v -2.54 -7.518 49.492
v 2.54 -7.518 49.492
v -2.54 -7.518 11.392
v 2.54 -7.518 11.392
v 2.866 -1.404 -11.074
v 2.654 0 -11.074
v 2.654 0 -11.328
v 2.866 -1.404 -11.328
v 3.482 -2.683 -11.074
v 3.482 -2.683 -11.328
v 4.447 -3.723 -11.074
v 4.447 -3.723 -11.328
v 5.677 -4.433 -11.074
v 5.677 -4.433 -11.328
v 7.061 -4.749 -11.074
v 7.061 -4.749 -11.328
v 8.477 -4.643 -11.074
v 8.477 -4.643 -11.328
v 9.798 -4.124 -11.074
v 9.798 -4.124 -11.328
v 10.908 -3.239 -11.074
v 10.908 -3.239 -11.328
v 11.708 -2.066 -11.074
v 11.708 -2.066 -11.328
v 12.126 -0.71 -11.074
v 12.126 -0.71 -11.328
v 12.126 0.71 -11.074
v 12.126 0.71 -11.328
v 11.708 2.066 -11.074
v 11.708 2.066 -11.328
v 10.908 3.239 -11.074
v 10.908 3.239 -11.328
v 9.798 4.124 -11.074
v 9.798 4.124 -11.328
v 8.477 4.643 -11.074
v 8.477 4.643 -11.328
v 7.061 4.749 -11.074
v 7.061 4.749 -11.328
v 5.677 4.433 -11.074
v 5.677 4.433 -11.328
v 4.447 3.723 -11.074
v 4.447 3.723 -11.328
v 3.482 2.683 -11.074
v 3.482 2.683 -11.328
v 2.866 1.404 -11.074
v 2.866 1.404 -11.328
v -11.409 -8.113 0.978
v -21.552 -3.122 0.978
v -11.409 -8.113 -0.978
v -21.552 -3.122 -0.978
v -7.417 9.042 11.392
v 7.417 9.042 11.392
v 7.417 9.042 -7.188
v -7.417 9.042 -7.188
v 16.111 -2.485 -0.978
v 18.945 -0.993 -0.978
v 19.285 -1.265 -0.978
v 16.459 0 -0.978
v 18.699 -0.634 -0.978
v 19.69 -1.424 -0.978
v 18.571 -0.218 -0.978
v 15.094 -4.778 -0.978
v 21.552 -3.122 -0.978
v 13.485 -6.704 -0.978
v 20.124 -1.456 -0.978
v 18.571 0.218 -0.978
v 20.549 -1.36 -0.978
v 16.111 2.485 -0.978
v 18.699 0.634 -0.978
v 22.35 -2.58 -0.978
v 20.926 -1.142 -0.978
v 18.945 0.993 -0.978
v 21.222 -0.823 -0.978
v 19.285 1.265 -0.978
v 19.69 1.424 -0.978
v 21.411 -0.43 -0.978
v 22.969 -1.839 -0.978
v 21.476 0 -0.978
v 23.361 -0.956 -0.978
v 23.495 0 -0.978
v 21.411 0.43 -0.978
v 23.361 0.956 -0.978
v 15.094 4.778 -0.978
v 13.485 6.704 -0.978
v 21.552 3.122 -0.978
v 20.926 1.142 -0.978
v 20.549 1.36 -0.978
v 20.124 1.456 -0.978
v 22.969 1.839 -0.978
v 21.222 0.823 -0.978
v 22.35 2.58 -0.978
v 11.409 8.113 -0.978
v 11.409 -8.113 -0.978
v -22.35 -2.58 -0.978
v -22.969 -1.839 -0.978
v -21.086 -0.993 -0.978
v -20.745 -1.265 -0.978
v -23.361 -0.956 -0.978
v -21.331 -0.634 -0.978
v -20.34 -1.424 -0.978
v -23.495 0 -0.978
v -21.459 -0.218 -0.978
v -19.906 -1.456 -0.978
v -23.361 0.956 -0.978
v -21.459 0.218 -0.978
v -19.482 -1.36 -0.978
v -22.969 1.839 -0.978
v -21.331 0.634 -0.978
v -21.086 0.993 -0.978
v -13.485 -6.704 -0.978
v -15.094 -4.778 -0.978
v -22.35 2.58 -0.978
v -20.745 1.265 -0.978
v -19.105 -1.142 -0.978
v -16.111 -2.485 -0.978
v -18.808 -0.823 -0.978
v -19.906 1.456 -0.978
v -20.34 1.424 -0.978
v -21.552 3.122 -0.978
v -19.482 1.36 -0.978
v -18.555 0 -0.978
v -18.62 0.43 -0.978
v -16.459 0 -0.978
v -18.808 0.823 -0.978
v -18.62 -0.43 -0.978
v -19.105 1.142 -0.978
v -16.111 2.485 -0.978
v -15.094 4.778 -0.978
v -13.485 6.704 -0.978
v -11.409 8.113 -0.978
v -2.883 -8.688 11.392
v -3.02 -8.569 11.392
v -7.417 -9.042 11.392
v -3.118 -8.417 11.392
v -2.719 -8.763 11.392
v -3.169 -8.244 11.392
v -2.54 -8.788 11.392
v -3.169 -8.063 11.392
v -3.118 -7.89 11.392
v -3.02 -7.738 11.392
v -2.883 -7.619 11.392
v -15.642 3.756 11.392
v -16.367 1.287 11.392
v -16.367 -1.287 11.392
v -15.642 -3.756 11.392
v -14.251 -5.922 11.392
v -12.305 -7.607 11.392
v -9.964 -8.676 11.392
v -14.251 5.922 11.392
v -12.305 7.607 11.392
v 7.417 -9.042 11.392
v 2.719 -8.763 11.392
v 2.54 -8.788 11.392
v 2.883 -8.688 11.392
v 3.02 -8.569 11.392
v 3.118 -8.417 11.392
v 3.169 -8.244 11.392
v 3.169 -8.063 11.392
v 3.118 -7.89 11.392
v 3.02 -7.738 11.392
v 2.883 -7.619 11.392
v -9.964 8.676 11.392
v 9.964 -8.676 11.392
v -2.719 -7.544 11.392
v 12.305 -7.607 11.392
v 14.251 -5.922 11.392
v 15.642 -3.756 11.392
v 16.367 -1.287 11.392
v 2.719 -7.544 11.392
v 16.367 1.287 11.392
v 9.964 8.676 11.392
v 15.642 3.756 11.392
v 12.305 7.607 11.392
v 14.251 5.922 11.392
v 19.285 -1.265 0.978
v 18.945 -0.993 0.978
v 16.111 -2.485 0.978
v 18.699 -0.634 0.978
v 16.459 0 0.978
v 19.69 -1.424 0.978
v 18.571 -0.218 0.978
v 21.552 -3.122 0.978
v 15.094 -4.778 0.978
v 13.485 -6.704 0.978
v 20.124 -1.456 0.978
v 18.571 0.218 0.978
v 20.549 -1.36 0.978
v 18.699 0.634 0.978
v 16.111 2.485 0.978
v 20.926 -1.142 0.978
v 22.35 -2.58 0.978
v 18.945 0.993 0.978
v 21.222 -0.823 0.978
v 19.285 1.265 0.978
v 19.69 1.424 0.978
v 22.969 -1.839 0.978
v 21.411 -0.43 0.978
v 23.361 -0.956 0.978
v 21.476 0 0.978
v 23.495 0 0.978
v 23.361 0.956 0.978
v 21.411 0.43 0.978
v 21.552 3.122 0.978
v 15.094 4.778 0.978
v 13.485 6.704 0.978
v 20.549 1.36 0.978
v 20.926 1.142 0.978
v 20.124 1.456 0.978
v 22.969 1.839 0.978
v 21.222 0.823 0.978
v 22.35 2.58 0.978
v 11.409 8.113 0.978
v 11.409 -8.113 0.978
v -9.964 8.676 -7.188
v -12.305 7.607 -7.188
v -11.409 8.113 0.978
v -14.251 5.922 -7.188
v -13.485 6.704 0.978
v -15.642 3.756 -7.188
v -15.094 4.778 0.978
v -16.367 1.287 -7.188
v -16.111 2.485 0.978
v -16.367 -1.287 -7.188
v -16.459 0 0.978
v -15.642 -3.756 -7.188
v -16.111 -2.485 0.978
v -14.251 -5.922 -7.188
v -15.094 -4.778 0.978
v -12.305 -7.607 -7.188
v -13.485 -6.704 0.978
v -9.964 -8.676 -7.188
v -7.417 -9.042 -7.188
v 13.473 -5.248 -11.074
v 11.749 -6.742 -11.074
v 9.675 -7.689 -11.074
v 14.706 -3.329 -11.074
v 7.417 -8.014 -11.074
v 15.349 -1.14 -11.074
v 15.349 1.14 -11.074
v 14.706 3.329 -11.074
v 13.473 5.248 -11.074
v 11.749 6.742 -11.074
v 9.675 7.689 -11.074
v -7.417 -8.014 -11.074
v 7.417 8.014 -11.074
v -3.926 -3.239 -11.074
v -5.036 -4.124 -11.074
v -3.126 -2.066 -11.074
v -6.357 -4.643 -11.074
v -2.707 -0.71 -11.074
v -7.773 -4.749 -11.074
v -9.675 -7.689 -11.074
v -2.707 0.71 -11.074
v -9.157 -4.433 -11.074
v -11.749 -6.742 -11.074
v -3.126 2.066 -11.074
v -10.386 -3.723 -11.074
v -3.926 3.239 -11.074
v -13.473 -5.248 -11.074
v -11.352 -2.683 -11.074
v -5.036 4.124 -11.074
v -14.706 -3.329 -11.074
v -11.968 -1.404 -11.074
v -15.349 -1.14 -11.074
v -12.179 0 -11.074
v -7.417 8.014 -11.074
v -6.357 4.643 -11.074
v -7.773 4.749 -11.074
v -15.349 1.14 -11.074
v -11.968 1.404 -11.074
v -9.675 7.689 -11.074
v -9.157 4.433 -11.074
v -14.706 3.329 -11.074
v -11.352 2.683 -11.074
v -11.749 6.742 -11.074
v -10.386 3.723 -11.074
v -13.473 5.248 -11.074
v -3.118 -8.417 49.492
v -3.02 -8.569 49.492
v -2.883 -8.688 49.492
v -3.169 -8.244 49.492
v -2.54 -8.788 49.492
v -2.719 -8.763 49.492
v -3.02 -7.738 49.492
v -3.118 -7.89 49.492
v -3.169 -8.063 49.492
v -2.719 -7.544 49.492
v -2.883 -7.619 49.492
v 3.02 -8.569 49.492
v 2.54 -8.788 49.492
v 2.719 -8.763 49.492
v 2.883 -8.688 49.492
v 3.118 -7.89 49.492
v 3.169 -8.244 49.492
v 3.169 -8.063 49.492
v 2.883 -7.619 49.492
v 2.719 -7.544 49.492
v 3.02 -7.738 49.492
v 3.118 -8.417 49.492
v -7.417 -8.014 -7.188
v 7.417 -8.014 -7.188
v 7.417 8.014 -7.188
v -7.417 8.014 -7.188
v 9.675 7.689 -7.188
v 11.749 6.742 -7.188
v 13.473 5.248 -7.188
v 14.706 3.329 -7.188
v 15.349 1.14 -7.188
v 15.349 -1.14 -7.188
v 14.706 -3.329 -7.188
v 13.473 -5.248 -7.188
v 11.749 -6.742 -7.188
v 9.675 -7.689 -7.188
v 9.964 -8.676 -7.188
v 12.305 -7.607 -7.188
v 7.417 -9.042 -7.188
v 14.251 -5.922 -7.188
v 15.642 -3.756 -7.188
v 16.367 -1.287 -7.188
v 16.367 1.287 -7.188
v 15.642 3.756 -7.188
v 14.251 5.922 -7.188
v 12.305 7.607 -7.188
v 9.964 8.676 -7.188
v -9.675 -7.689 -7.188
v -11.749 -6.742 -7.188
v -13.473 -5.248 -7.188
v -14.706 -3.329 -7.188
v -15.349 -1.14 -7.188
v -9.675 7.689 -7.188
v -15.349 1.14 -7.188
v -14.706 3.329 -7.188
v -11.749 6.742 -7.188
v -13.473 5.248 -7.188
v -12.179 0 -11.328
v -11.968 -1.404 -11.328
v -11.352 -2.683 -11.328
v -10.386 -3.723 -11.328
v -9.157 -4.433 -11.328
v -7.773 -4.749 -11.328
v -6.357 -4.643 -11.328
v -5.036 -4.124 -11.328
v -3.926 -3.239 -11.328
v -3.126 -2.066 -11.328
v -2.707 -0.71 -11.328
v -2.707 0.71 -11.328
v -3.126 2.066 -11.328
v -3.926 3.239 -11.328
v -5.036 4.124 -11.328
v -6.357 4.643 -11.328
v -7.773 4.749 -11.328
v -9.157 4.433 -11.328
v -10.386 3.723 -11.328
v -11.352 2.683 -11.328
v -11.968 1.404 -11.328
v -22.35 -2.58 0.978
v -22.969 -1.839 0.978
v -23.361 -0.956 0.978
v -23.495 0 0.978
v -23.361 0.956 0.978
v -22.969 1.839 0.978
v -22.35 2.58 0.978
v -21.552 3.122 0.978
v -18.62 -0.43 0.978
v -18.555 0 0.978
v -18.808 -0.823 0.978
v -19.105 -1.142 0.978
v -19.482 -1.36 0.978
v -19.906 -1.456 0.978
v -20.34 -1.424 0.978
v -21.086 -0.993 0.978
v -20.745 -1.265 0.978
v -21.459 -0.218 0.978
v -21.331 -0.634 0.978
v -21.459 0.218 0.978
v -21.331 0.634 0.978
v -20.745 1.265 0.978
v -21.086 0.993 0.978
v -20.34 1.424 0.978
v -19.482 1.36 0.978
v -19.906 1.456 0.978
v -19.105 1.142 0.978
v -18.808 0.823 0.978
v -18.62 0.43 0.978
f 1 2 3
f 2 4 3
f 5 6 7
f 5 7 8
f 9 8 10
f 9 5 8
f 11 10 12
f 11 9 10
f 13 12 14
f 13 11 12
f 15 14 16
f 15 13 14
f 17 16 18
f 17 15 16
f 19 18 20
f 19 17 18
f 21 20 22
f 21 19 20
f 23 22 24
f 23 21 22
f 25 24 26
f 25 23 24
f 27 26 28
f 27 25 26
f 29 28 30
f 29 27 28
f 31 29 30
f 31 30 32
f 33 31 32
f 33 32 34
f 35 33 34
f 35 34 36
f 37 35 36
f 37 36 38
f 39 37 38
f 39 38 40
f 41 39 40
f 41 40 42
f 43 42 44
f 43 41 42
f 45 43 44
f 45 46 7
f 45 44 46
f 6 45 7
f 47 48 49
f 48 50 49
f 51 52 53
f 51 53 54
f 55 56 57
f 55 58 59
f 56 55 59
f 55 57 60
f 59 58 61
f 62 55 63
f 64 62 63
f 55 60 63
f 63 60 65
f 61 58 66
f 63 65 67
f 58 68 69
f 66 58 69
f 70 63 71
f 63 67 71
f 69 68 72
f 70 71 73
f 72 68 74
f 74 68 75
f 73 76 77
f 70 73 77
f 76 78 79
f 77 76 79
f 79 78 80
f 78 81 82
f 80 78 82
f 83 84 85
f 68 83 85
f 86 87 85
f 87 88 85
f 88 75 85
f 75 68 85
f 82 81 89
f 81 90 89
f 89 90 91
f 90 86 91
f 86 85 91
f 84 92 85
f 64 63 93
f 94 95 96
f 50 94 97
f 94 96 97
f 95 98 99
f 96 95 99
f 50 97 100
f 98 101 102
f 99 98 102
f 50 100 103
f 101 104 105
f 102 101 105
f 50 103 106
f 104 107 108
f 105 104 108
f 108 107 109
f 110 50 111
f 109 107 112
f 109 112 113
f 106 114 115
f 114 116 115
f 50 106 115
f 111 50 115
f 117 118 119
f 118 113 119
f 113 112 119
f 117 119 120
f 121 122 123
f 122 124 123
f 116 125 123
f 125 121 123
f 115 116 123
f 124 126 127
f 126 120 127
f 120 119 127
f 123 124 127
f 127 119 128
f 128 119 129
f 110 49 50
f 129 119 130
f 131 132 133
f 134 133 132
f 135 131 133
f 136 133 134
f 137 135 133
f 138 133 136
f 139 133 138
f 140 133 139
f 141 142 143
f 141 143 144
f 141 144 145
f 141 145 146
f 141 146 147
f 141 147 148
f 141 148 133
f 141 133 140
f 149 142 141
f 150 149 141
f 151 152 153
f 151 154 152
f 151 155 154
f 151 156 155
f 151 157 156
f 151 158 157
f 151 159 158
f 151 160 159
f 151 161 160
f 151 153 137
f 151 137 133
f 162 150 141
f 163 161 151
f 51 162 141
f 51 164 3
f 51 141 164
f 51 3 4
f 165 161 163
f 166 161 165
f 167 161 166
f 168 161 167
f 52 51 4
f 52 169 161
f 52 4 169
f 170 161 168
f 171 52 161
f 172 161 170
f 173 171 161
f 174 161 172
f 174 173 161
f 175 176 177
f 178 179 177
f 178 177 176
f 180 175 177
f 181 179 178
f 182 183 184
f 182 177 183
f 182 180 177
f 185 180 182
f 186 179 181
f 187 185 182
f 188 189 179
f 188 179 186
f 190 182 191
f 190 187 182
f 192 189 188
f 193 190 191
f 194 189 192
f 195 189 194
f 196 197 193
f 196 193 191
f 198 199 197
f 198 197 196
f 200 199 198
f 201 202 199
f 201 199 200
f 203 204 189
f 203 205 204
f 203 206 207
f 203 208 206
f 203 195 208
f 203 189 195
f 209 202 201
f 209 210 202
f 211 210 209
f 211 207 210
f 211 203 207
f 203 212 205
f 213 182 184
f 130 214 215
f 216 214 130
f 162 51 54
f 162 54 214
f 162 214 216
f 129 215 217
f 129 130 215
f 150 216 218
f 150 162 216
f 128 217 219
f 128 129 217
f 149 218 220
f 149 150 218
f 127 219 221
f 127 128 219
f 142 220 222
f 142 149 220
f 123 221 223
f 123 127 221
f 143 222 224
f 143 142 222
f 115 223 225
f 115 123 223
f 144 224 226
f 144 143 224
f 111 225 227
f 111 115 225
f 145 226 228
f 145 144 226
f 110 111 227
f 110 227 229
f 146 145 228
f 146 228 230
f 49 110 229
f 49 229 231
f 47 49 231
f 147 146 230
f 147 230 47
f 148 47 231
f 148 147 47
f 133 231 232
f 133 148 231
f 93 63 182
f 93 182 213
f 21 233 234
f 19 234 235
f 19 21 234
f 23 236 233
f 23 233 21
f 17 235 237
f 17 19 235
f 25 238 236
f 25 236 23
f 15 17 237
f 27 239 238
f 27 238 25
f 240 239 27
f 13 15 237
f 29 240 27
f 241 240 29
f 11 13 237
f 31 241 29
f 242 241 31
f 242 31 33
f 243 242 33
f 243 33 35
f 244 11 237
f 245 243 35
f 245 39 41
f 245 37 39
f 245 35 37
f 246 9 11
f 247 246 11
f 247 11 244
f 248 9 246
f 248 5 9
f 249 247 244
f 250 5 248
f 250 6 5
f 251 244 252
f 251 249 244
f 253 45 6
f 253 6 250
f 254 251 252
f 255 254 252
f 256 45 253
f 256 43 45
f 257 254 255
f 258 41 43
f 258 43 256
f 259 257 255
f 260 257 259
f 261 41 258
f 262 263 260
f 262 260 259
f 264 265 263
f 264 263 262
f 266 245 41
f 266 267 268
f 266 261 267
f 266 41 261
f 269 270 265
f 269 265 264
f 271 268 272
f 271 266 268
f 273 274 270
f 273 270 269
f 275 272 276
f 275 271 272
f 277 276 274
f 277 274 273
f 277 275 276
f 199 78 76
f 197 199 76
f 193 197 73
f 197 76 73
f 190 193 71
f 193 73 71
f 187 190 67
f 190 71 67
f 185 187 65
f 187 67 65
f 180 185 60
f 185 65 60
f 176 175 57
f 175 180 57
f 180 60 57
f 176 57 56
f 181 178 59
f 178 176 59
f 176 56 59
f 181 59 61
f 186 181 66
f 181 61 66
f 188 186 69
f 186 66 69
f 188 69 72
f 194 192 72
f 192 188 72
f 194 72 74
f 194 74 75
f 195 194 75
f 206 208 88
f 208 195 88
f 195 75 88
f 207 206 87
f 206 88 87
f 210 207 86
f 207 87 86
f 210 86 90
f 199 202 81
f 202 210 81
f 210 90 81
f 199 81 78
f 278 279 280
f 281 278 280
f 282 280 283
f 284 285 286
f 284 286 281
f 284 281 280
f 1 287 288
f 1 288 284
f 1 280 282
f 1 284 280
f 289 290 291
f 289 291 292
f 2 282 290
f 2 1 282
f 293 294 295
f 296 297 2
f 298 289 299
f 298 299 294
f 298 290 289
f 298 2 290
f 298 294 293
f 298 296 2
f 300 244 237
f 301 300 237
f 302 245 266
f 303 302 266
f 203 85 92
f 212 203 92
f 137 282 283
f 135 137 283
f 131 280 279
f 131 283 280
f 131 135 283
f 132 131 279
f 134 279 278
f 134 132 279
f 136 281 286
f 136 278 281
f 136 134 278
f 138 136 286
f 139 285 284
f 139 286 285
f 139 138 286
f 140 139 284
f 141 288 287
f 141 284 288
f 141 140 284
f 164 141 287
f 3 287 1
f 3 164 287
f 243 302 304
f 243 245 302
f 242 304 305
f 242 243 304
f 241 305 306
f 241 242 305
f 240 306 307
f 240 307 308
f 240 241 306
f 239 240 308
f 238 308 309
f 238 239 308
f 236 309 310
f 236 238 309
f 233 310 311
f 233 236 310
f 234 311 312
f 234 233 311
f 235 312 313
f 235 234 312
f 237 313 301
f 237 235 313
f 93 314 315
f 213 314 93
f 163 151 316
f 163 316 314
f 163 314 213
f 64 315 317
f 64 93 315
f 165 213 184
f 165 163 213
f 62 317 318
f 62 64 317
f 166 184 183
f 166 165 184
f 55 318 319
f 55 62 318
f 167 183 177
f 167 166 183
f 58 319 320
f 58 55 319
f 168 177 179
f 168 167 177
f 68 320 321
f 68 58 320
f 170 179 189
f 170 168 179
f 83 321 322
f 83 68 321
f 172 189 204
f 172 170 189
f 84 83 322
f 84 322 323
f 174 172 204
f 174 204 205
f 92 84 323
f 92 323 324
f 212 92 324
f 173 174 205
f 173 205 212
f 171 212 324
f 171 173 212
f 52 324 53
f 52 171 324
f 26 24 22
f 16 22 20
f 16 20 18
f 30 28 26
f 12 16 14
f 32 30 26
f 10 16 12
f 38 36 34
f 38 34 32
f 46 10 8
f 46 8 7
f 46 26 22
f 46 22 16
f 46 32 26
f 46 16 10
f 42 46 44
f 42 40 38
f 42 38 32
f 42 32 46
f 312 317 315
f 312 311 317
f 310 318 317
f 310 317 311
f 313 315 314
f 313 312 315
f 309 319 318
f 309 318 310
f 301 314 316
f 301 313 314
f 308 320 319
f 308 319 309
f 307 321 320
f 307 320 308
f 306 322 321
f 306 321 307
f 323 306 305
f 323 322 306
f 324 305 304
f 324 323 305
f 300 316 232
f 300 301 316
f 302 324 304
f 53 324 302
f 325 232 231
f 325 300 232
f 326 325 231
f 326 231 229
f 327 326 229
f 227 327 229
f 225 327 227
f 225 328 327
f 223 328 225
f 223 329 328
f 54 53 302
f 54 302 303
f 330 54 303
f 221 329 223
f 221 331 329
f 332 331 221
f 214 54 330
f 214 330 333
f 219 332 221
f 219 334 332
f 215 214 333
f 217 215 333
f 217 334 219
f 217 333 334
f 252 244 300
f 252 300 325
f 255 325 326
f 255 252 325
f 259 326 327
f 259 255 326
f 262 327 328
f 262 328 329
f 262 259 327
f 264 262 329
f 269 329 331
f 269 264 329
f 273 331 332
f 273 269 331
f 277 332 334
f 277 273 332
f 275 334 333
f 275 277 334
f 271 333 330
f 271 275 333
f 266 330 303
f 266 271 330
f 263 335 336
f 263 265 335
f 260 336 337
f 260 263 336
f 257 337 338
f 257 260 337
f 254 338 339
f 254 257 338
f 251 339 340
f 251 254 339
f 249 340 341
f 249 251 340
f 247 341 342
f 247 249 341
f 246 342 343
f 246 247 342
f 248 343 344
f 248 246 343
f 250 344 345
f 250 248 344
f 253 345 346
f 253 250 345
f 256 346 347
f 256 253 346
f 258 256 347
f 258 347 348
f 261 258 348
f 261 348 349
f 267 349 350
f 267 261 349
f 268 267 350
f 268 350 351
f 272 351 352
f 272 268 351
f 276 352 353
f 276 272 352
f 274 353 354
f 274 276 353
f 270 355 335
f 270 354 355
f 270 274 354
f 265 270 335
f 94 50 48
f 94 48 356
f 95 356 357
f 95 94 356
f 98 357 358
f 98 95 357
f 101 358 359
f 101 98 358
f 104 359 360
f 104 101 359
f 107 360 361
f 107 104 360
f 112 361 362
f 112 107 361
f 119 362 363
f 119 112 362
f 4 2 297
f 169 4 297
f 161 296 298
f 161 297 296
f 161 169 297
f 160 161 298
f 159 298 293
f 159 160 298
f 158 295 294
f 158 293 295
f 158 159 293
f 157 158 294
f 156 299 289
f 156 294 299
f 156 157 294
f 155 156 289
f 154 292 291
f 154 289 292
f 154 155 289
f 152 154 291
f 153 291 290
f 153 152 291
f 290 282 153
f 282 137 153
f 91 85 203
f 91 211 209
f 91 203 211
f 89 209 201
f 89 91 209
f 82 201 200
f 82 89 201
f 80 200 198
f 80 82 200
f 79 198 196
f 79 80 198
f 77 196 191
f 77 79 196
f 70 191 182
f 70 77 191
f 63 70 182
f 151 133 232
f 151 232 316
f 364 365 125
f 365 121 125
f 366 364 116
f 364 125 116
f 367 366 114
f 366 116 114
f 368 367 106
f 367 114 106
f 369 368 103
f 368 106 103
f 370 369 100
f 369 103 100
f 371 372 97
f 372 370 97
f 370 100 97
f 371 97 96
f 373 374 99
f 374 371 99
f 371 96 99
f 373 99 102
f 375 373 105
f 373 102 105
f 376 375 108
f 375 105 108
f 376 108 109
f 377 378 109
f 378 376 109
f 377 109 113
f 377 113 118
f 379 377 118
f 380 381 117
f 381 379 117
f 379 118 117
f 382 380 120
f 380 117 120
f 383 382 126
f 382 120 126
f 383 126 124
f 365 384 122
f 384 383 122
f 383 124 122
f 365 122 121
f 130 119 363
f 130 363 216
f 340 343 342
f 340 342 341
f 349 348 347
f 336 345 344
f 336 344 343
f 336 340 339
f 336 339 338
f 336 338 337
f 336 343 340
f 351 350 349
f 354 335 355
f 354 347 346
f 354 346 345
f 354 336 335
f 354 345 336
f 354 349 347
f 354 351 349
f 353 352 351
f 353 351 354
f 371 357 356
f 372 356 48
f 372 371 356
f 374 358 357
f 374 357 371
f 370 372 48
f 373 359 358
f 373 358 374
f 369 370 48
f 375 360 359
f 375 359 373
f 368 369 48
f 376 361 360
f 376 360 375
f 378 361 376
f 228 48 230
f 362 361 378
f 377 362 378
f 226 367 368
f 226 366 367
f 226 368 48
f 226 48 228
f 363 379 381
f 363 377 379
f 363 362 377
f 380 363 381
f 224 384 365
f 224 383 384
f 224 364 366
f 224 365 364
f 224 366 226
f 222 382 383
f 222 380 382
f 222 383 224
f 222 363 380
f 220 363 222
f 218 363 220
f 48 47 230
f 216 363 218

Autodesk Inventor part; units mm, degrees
ref_plane "YZ Plane" through (0, 0, 0) normal (1, 0, 0) x (0, 1, 0)
ref_plane "XZ Plane" through (0, 0, 0) normal (0, 1, 0) x (-1, 0, 0)
ref_plane "XY Plane" through (0, 0, 0) normal (0, 0, 1) x (1, 0, 0)
sketch "Sketch12" plane through (0, 0, 0) normal (0, 0, 1) x (1, 0, 0)
  line L0 (-7.4168, 0) -> (7.4168, 0) construction
  line L1 (-7.4168, -9.0424) -> (7.4168, -9.0424)
  line L2 (7.4168, 9.0424) -> (-7.4168, 9.0424)
  arc A0 (-7.4168, 9.0424) -> (-7.4168, -9.0424) centre (-7.4168, 0) ccw
  arc A1 (7.4168, -9.0424) -> (7.4168, 9.0424) centre (7.4168, 0) ccw
  circle A2 centre (-20.0152, 0) radius 1.4605
  line L3 (0, 0) -> (0, -9.0424)
  circle A3 centre (-20.0152, 0) radius 3.4798
  line L4 (-21.5516, -3.1222) -> (-11.4093, -8.1133)
  line L5 (-21.5516, 3.1222) -> (-11.4093, 8.1133)
  circle A4 centre (20.0152, 0) radius 1.4605
  circle A5 centre (20.0152, 0) radius 3.4798
  line L6 (21.5516, -3.1222) -> (11.4093, -8.1133)
  line L7 (21.5516, 3.1222) -> (11.4093, 8.1133)
  point P0 (16.4592, 0)
  point P1 (-16.4592, 0)
  point P2 (11.4093, -8.1133)
  point P3 (11.4093, 8.1133)
  dimension "d107" = 32.9184
  dimension "d108" = 18.0848
  dimension "d109" = 40.0304
  dimension "d110" = 2.921
  dimension "d111" = 46.99
extrude "Extrusion1" add sketch "Sketch12" along normal mid plane 1.9558
sketch "Sketch13" plane through (0, 0, 0.9779) normal (0, 0, 1) x (1, 0, 0)
  arc A0 (-7.4168, 9.0424) -> (-7.4168, -9.0424) centre (-7.4168, 0) ccw projected
  arc A1 (7.4168, -9.0424) -> (7.4168, 9.0424) centre (7.4168, 0) ccw projected
  line L0 (7.4168, 9.0424) -> (-7.4168, 9.0424) projected
  line L1 (-7.4168, -9.0424) -> (7.4168, -9.0424) projected
  point P0 (0, 0)
extrude "Extrusion2" add sketch "Sketch13" along normal blind 10.414
sketch "Sketch14" plane through (0, 0, -0.9779) normal (0, 0, -1) x (-1, 0, 0)
  line L0 (7.4168, -9.0424) -> (-7.4168, -9.0424) projected
  arc A0 (-7.4168, 9.0424) -> (-7.4168, -9.0424) centre (-7.4168, 0) ccw projected
  line L1 (-7.4168, 9.0424) -> (7.4168, 9.0424) projected
  arc A1 (7.4168, -9.0424) -> (7.4168, 9.0424) centre (7.4168, 0) ccw projected
  point P0 (0, 0)
extrude "Extrusion3" add sketch "Sketch14" along normal blind 10.0965
sketch "Sketch15" plane through (0, 0, -11.0744) normal (0, 0, -1) x (-1, 0, 0)
  line L0 (-7.4168, -9.0424) -> (7.4168, -9.0424) projected
  arc A0 (7.4168, -9.0424) -> (7.4168, 9.0424) centre (7.4168, 0) ccw projected
  line L1 (7.4168, 9.0424) -> (-7.4168, 9.0424) projected
  arc A1 (-7.4168, 9.0424) -> (-7.4168, -9.0424) centre (-7.4168, 0) ccw projected
  line L2 (7.4168, -8.0137) -> (-7.4168, -8.0137)
  arc A2 (-7.4168, 8.0137) -> (-7.4168, -8.0137) centre (-7.4168, 0) ccw
  line L3 (-7.4168, 8.0137) -> (7.4168, 8.0137)
  arc A3 (7.4168, -8.0137) -> (7.4168, 8.0137) centre (7.4168, 0) ccw
  point P0 (0, 0)
  dimension "d118" = 16.0274
extrude "Extrusion4" cut sketch "Sketch15" against normal blind 3.8862
sketch "Sketch16" plane through (0, 0, -11.0744) normal (0, 0, -1) x (-1, 0, 0)
  arc A0 (7.4168, -8.0137) -> (7.4168, 8.0137) centre (7.4168, 0) ccw projected
  line L0 (7.4168, 8.0137) -> (-7.4168, 8.0137) projected
  arc A1 (-7.4168, 8.0137) -> (-7.4168, -8.0137) centre (-7.4168, 0) ccw projected
  line L1 (-7.4168, -8.0137) -> (7.4168, -8.0137) projected
  circle A2 centre (7.4168, 0) radius 4.7625
  circle A3 centre (-7.4168, 0) radius 4.7625
  point P0 (0, 0)
  dimension "d121" = 9.525
extrude "Extrusion5" add sketch "Sketch16" along normal blind 0.254 contours A2 | A3
sketch "Sketch17" plane through (0, 0, 11.3919) normal (0, 0, 1) x (1, 0, 0)
  line L0 (-7.4168, -9.0424) -> (7.4168, -9.0424) projected
  line L1 (2.54, -8.1534) -> (-2.54, -8.1534) construction
  line L2 (2.54, -7.5184) -> (-2.54, -7.5184)
  line L3 (-2.54, -8.7884) -> (2.54, -8.7884)
  arc A0 (2.54, -8.7884) -> (2.54, -7.5184) centre (2.54, -8.1534) ccw
  arc A1 (-2.54, -7.5184) -> (-2.54, -8.7884) centre (-2.54, -8.1534) ccw
  point P0 (0, 0)
  point P1 (0, -8.1534)
  point P2 (0, -8.7884)
  point P3 (0, -9.0424)
  dimension "d124" = 5.08
  dimension "d125" = 0.254
  dimension "d126" = 1.27
extrude "Extrusion6" add sketch "Sketch17" along normal blind 38.1
equation "\"BendRadius\" = Thickness"
equation "\"BendReliefWidth\" = Thickness"
equation "\"BendReliefDepth\" = 0.5 * Thickness"
equation "\"CornerReliefSize\" = 4 * Thickness"
equation "\"MinimumRemnant\" = 2 * Thickness"
equation "\"TransitionRadius\" = BendRadius"
equation "\"JacobiRadiusSize\" = BendRadius"
equation "\"GapSize\" = Thickness"
equation "\"Thickness\" = 4.7625"
properties part number "Cage Sensor" material "Steel, Mild"
